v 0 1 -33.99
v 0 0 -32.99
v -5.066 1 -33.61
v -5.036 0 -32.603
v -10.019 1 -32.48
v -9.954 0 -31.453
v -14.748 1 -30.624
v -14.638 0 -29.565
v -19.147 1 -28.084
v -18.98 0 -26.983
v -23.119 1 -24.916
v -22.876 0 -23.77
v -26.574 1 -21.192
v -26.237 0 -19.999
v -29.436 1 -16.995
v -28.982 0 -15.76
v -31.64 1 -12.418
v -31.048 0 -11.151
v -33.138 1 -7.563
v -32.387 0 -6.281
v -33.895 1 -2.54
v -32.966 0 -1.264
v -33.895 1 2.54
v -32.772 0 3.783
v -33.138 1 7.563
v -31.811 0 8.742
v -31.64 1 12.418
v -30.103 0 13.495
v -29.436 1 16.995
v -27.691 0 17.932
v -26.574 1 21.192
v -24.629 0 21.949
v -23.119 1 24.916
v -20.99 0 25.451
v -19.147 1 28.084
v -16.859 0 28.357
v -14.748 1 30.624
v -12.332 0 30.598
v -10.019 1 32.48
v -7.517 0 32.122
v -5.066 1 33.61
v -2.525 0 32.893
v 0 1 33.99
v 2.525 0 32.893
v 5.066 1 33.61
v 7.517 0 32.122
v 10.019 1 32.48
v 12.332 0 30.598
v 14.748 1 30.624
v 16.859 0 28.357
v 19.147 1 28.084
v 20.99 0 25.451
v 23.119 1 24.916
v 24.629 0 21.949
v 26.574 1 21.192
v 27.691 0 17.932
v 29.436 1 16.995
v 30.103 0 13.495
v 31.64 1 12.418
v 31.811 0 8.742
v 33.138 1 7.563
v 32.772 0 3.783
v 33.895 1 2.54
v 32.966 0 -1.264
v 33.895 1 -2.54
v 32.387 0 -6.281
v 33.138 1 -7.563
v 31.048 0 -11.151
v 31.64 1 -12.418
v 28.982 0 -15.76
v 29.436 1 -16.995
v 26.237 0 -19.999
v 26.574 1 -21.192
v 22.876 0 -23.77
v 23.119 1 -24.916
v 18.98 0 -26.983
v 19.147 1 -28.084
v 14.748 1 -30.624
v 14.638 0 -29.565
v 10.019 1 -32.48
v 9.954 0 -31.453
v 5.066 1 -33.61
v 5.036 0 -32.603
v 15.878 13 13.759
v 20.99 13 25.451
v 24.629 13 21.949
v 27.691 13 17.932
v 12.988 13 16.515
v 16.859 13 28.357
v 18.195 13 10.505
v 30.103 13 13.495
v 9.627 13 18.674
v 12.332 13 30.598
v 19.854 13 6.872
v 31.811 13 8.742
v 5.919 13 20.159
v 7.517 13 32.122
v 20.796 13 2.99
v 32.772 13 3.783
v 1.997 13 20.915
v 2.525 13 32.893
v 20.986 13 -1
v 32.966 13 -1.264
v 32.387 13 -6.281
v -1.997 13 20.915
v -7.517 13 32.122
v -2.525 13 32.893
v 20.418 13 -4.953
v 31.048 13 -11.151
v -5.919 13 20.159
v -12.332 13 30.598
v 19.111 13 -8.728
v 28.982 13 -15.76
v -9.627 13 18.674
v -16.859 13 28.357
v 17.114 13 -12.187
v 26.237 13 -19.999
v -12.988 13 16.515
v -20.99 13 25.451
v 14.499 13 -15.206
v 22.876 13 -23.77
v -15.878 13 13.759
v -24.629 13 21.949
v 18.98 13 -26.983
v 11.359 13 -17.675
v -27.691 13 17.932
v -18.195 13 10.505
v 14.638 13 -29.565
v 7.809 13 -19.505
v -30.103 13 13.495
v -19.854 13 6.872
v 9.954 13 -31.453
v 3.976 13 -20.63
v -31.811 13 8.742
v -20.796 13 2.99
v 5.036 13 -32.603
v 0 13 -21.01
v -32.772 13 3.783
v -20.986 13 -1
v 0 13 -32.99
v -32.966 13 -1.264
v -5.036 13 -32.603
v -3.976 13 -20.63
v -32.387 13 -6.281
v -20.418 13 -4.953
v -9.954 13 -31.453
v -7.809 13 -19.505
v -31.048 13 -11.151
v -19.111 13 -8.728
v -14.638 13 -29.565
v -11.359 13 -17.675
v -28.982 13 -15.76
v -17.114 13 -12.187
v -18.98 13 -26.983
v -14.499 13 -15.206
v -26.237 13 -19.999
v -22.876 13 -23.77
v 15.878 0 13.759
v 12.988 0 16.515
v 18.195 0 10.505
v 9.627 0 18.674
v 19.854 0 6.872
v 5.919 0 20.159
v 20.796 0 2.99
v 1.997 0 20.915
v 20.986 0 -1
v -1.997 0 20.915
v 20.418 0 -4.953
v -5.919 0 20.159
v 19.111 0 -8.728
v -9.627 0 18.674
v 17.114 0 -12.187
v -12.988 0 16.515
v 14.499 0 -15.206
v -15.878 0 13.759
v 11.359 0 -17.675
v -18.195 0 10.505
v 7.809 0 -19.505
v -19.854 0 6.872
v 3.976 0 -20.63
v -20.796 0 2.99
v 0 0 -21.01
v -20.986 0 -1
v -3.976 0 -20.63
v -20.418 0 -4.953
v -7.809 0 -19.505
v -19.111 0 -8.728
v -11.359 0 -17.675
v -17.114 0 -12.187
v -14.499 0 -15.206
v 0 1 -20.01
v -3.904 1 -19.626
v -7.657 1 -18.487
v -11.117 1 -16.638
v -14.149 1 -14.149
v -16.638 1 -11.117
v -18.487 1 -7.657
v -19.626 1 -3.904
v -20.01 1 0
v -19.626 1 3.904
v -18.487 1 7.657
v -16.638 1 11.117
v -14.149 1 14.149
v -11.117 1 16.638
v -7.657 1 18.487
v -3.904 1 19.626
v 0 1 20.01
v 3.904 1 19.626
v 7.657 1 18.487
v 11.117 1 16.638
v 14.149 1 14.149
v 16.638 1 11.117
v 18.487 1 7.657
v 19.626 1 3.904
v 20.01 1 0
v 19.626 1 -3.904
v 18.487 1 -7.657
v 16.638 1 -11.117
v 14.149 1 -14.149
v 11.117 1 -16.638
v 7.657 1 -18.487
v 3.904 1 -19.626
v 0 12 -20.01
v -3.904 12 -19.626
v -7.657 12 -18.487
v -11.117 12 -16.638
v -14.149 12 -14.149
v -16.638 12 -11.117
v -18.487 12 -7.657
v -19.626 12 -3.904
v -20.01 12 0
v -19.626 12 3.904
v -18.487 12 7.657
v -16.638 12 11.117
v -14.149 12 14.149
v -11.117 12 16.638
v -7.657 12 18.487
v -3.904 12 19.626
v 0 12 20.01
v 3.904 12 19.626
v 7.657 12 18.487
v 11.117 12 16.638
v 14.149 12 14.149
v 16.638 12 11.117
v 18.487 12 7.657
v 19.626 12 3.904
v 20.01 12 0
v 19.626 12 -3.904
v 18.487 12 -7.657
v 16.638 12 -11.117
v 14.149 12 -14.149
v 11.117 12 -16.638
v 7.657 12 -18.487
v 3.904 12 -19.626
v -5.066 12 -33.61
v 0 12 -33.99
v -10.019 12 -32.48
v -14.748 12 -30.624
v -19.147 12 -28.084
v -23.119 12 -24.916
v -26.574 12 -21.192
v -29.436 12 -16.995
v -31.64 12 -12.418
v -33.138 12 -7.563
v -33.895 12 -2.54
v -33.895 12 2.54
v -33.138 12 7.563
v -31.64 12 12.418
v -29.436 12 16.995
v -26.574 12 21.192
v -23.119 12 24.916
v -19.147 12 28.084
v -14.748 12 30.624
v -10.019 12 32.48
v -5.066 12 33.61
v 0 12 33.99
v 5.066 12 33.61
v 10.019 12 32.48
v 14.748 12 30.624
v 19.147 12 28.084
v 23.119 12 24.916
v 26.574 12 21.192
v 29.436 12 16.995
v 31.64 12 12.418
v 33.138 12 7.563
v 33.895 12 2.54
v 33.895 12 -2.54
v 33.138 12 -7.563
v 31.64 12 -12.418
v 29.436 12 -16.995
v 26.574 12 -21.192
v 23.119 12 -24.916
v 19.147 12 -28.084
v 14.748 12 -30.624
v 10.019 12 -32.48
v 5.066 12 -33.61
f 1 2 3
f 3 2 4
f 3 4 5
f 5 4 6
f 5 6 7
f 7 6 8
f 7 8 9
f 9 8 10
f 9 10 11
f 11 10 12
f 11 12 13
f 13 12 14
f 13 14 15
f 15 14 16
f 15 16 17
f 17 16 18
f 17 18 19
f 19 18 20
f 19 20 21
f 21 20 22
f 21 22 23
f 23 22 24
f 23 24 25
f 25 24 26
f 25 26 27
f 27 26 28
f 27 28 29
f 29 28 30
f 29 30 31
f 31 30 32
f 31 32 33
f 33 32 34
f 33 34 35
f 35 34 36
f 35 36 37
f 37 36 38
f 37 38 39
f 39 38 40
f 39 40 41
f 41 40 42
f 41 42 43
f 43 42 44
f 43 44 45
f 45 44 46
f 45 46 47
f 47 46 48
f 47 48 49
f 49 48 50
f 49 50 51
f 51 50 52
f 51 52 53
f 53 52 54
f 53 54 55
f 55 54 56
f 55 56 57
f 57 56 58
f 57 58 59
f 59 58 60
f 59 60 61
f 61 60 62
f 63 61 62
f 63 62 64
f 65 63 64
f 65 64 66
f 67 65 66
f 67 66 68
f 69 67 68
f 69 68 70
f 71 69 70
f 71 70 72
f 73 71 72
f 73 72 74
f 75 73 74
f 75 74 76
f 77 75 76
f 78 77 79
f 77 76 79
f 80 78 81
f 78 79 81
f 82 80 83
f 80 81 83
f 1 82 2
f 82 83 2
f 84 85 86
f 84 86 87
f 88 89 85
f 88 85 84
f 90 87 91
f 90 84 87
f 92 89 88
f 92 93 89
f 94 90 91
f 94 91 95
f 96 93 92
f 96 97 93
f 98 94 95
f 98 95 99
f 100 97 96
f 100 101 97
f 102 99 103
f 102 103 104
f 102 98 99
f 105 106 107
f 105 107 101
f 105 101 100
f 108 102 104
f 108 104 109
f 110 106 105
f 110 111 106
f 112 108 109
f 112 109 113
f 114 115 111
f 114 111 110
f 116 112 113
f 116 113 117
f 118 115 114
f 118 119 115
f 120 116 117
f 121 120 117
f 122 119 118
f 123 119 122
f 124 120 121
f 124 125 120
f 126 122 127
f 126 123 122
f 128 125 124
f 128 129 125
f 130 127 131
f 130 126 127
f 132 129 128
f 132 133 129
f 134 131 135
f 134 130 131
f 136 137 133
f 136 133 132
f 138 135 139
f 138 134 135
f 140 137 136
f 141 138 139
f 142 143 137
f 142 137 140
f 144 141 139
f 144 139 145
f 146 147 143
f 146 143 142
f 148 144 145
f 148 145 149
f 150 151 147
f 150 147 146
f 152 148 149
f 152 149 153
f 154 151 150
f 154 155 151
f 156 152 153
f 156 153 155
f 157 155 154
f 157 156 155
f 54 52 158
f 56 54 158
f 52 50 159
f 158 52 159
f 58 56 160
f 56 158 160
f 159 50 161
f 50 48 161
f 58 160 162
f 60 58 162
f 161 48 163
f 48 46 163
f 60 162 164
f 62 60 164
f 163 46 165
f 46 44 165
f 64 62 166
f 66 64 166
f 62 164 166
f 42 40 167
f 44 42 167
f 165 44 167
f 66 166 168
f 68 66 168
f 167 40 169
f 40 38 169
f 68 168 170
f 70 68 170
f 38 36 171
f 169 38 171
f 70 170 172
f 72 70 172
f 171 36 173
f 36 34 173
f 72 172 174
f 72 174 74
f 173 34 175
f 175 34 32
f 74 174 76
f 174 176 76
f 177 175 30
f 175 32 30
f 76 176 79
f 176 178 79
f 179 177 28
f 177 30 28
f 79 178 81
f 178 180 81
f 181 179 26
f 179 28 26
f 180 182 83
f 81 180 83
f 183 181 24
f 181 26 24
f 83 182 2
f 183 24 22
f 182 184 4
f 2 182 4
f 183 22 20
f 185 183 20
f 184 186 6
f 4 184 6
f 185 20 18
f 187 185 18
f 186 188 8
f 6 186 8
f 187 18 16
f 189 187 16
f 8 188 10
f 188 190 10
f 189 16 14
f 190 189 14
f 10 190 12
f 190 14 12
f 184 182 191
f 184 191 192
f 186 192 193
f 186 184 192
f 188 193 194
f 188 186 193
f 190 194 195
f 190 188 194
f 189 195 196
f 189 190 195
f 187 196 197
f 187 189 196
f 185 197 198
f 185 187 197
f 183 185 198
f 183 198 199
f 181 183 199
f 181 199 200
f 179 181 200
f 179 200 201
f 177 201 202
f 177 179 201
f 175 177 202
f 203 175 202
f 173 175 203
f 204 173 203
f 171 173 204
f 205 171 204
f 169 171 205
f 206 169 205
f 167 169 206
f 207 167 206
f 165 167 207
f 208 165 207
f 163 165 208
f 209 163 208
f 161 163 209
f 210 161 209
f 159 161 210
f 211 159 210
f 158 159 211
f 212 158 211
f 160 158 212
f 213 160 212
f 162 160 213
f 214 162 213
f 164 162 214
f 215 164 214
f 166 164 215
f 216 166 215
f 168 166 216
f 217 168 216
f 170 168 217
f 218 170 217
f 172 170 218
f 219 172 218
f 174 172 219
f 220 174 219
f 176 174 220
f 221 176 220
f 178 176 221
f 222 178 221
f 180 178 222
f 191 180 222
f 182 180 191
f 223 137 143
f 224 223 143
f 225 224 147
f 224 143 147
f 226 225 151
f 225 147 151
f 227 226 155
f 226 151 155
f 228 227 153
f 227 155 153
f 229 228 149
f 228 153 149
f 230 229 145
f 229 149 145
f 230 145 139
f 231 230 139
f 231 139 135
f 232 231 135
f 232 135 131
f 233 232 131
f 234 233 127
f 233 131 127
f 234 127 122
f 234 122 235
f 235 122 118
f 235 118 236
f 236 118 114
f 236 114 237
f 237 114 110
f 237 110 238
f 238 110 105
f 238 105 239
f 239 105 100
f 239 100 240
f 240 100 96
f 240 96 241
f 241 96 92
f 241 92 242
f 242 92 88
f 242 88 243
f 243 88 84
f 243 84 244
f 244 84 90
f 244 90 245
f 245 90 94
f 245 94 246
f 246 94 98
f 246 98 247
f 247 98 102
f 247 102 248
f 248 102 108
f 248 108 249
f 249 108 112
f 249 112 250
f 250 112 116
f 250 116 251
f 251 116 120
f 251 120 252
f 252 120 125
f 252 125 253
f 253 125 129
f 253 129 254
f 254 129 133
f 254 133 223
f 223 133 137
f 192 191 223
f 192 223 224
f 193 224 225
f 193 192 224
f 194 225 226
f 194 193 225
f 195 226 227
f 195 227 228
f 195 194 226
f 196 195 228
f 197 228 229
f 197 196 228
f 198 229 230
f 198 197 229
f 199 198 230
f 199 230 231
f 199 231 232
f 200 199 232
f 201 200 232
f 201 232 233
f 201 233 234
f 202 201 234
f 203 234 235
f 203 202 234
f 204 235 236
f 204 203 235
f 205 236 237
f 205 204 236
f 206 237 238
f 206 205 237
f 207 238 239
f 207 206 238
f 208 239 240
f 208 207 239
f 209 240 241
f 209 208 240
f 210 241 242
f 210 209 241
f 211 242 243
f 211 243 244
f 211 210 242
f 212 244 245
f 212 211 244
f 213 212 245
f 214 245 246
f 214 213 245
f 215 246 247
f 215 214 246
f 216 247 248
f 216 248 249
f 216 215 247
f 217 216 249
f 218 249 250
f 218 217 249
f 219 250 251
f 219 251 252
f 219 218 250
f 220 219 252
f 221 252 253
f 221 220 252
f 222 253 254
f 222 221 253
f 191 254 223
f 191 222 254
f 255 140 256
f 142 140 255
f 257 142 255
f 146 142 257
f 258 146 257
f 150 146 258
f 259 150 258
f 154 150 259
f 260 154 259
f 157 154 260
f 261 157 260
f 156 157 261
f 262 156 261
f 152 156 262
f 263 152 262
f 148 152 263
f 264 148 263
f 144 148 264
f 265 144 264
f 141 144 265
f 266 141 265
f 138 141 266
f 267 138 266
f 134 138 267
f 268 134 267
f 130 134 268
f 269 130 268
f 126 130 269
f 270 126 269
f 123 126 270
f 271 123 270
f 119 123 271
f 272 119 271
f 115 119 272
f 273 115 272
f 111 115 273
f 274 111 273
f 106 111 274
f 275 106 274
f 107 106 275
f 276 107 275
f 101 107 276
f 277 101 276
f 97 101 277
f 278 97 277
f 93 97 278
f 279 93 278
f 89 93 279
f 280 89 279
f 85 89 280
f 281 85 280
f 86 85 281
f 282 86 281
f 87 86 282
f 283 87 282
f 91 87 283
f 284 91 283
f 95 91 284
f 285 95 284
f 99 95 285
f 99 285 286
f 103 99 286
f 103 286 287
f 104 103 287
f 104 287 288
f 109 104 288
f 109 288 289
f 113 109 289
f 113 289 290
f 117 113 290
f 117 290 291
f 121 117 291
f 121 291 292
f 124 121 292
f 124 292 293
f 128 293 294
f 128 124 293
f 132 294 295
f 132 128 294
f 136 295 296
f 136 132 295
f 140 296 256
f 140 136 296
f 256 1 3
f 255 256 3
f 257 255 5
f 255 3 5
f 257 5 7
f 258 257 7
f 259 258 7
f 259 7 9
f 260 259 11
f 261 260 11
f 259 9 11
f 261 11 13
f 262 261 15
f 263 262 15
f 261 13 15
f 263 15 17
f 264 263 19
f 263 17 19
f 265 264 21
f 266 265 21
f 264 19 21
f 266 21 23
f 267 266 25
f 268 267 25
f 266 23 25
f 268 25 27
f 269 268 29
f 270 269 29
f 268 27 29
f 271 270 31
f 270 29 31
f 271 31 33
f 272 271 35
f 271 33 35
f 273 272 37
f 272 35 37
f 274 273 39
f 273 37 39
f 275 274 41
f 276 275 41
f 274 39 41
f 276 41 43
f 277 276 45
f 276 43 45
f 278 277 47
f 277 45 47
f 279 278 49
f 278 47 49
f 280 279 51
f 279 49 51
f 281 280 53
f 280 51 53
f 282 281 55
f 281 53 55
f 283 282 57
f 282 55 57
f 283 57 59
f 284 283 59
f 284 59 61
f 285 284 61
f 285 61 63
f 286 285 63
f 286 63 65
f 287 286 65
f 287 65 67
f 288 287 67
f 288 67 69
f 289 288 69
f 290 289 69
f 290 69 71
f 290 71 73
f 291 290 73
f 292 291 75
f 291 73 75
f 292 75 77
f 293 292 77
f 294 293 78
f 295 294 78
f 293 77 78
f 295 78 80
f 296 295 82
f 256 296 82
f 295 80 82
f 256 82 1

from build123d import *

# Parameters (mm, degrees)
SKETCH_1_R      = 33.99
SKETCH_1_R_2    = 20.01
EXTRUDE_1_DEPTH = 13
CHAMFER_1_SIZE  = 1


with BuildPart() as part:
    # 草图1 → 凸台-拉伸1 (new body)
    with BuildSketch(Plane(origin=(0, 0, 0), x_dir=(1, 0, 0), z_dir=(0, 1, 0))):
        with Locations(Location((0, 0, 0), (0, 0, 90))):
            Circle(SKETCH_1_R)
        with Locations(Location((0, 0, 0), (0, 0, 90))):
            Circle(SKETCH_1_R_2, mode=Mode.SUBTRACT)
    extrude(amount=EXTRUDE_1_DEPTH)

    # 倒角1
    chamfer_1_edges = [part.edges().sort_by_distance(p)[0] for p in [
        (0, 0, 33.99),
        (0, 13, 33.99),
        (0, 0, 20.01),
        (0, 13, 20.01),
    ]]
    chamfer(chamfer_1_edges, length=CHAMFER_1_SIZE)


solid = part.part
